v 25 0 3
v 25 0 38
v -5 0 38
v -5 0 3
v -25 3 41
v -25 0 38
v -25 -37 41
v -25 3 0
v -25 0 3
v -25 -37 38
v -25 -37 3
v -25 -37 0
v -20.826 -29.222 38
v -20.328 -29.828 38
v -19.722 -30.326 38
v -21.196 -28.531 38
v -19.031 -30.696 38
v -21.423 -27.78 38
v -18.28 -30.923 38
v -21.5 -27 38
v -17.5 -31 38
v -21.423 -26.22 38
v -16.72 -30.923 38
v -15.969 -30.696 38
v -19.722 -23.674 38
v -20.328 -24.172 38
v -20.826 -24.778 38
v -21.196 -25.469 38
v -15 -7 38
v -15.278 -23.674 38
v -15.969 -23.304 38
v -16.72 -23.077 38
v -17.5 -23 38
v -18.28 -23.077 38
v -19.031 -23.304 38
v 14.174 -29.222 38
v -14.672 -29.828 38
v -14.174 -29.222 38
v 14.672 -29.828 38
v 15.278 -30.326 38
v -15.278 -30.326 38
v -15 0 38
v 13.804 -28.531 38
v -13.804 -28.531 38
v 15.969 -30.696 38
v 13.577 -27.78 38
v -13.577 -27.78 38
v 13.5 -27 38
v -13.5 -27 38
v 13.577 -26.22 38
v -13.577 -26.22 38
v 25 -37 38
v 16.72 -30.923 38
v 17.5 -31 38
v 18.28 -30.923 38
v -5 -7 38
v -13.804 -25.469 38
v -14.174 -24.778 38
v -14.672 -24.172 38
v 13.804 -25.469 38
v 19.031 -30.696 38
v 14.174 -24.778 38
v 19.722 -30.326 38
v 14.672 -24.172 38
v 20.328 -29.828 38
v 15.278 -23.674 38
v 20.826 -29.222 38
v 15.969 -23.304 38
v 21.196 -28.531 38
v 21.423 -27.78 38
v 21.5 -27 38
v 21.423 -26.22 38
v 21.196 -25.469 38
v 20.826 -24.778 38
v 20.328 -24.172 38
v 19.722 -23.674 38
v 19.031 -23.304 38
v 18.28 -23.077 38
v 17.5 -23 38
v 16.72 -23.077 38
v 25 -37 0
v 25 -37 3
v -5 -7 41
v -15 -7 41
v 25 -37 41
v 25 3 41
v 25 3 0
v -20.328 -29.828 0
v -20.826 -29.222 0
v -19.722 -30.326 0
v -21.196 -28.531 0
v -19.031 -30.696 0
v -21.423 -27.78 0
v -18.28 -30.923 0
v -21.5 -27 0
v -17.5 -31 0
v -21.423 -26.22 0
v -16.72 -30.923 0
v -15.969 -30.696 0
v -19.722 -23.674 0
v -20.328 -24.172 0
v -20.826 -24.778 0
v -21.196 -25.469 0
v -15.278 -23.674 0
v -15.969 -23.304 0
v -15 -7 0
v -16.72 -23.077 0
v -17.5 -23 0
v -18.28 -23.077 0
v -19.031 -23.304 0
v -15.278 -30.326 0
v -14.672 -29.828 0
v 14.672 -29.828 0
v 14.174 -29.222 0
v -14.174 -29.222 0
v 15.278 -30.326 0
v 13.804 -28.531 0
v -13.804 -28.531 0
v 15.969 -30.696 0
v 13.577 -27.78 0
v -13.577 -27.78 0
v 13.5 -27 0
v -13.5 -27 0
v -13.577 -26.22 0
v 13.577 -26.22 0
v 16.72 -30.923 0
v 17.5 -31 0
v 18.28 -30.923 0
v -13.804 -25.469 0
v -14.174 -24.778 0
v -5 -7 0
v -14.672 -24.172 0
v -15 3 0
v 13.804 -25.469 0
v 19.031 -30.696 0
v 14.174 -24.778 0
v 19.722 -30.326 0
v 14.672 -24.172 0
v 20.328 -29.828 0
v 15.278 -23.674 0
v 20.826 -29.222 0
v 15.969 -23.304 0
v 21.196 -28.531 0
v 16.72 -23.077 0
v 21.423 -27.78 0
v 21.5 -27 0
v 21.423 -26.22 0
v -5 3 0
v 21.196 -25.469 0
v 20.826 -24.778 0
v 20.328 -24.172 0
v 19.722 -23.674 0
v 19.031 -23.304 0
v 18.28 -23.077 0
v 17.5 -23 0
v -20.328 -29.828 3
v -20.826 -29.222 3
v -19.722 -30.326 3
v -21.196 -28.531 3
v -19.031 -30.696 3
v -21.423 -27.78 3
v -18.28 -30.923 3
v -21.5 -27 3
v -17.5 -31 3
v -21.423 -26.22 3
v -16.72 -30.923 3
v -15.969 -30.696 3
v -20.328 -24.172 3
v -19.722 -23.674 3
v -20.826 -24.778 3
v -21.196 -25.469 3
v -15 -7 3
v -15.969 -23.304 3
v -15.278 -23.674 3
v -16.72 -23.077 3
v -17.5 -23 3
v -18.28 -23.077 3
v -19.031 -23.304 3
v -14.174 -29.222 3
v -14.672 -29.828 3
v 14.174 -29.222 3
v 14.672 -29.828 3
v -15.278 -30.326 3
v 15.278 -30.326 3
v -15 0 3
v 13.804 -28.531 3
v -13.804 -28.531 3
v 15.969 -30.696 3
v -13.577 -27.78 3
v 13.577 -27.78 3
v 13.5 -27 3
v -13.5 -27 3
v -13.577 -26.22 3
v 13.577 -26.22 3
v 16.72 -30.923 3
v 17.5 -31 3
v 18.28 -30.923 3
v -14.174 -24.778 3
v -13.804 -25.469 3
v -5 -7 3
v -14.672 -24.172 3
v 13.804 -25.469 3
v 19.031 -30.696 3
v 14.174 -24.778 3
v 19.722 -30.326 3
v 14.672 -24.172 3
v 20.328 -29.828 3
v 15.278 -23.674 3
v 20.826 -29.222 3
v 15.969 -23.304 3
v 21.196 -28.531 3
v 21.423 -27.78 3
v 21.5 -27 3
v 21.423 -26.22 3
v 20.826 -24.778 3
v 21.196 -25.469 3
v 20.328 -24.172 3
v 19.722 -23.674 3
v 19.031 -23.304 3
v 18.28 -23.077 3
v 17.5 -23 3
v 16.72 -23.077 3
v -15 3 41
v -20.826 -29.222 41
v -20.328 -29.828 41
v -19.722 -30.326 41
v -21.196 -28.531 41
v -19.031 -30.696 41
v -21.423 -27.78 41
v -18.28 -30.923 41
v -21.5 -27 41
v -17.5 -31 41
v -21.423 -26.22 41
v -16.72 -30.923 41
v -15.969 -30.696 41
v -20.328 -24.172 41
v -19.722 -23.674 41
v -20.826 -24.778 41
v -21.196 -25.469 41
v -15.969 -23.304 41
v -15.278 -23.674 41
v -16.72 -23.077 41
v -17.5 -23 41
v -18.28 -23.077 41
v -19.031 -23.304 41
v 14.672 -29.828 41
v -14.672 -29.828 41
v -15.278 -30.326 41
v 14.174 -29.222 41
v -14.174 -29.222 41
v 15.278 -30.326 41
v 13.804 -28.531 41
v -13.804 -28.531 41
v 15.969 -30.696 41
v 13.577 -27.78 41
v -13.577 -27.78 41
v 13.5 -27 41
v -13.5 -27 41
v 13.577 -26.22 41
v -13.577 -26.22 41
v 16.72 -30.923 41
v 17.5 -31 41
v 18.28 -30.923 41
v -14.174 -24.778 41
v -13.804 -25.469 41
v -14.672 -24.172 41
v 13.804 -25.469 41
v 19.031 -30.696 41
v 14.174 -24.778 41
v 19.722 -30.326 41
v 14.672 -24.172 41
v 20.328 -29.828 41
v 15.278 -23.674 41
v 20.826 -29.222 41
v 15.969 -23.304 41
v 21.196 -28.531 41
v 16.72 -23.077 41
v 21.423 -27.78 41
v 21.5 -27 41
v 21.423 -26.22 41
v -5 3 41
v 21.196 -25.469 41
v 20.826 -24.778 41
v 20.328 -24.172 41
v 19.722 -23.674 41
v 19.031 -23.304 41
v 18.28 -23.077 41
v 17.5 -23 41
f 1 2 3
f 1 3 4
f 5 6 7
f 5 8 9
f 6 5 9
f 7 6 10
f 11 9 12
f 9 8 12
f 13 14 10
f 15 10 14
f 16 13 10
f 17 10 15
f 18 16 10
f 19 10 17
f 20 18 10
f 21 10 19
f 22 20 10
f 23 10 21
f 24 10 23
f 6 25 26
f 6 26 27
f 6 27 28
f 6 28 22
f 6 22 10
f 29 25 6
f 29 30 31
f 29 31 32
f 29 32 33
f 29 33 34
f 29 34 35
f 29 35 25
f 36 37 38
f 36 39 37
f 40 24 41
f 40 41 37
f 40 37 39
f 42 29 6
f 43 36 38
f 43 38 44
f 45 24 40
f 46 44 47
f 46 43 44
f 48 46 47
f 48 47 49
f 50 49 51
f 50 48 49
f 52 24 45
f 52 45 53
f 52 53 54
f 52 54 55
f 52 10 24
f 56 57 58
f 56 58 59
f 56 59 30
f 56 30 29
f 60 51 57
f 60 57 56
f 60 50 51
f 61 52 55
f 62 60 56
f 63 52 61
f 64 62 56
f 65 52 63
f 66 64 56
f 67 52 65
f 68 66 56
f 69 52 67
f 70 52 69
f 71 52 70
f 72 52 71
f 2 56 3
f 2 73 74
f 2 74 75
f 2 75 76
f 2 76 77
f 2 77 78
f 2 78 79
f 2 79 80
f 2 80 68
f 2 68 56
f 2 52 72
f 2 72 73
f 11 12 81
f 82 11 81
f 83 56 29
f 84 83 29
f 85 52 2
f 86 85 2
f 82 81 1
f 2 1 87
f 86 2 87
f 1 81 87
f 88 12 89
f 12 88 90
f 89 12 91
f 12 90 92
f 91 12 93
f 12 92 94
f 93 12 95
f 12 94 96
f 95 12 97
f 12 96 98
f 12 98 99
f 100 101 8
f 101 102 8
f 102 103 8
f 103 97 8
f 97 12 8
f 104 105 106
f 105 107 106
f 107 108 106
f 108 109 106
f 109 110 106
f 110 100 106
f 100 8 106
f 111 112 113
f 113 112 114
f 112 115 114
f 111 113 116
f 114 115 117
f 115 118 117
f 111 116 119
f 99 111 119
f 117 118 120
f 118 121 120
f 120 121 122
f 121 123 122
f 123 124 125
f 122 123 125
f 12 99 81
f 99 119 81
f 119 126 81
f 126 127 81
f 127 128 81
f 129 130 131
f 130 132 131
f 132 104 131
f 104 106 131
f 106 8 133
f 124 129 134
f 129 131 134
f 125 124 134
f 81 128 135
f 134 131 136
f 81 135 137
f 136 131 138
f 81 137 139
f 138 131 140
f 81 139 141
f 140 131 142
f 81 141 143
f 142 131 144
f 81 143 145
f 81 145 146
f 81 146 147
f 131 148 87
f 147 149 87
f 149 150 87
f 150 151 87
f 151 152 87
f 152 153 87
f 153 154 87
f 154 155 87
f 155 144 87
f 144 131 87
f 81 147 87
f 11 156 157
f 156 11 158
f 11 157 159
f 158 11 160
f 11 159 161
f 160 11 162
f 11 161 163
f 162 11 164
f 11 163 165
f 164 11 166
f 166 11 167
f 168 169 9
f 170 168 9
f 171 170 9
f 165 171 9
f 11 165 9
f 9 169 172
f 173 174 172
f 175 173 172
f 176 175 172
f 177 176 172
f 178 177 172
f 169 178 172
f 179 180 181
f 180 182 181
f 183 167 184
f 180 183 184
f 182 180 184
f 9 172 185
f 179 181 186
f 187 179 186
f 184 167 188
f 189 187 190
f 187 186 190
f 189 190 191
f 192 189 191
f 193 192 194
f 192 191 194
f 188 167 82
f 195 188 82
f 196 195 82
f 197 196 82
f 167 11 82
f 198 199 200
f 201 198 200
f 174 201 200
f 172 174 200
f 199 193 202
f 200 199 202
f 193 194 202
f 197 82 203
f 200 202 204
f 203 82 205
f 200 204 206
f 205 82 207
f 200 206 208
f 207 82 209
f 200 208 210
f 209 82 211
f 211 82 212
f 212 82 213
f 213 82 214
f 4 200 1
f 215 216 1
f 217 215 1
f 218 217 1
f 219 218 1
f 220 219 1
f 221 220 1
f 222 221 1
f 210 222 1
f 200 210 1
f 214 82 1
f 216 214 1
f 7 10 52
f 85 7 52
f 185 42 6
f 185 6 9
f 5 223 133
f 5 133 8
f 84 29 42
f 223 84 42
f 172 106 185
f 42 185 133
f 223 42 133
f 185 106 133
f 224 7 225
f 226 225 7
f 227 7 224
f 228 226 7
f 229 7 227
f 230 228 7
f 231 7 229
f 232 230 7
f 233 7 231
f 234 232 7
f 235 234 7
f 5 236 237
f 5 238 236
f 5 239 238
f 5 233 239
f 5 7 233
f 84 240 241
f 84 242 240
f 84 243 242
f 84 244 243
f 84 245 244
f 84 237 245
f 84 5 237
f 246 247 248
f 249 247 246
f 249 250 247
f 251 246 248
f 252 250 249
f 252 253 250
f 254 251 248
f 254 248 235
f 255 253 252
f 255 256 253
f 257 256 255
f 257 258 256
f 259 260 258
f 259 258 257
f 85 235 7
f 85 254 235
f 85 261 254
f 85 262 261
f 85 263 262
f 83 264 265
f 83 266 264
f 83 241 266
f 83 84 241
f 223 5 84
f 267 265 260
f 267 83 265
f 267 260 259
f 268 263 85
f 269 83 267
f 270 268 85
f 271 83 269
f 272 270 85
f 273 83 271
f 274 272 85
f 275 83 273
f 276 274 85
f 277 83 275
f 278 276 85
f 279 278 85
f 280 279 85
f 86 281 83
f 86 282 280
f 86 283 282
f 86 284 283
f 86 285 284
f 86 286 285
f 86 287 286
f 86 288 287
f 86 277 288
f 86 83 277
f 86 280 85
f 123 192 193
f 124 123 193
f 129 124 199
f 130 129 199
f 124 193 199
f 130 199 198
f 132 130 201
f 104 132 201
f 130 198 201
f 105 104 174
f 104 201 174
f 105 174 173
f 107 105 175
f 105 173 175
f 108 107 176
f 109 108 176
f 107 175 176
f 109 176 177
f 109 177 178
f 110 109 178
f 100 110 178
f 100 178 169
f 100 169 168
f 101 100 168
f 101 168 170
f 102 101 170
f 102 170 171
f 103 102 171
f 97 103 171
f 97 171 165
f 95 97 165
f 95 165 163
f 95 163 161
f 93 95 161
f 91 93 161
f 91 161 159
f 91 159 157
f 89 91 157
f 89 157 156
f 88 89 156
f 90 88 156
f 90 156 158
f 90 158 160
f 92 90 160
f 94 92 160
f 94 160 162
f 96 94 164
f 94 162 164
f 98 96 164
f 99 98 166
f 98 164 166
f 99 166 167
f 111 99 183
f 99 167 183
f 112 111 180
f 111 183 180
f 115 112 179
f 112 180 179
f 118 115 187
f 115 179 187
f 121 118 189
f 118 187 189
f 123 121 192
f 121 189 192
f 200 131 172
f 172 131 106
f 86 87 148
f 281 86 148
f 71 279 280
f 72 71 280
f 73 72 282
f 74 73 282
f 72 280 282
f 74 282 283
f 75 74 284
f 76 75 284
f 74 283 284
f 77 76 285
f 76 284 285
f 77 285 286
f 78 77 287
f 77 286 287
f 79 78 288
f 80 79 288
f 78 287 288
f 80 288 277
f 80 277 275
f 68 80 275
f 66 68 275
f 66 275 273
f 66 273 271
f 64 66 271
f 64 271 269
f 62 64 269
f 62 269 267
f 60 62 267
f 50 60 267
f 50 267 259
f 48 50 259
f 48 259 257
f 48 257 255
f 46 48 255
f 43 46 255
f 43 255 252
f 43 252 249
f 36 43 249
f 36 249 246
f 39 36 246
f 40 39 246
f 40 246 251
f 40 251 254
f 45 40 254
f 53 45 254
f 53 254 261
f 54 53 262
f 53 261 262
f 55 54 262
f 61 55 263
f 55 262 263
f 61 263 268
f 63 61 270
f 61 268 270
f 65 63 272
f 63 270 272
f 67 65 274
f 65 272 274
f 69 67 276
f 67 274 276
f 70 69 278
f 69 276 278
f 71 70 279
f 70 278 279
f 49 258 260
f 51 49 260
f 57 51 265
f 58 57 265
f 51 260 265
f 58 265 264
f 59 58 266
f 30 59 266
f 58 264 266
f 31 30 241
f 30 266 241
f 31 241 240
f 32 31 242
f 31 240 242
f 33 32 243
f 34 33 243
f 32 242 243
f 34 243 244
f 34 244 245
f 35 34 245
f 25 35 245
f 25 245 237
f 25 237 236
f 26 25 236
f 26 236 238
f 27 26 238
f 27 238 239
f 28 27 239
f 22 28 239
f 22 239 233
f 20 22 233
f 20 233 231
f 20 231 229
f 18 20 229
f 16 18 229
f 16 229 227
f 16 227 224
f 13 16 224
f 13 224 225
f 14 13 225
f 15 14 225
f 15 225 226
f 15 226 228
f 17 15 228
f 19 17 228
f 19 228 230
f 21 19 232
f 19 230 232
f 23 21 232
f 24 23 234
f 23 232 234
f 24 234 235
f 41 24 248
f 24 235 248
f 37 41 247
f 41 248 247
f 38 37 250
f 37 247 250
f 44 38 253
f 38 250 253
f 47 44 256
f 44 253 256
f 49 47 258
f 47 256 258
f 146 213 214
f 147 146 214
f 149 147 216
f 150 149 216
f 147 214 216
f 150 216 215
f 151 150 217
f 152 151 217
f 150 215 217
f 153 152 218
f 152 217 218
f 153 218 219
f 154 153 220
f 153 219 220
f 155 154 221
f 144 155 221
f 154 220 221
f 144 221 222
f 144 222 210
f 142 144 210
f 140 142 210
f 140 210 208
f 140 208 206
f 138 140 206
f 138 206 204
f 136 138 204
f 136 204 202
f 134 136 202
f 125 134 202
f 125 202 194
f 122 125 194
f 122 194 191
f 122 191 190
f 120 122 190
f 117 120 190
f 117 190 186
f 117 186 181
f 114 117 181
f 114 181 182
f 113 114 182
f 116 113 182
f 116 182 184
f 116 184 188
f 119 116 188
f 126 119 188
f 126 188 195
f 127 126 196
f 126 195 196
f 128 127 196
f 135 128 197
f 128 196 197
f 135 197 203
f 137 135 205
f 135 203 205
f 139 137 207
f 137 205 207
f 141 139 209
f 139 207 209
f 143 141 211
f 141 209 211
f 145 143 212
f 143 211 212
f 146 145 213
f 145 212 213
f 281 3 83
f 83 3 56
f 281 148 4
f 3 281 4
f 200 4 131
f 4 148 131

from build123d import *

# Parameters (mm, degrees)
EXTRUDE_1_DEPTH     = 41
SKETCH_2_W          = 35
SKETCH_2_H          = 37
CUT_EXTRUDE_1_DEPTH = 75.498322129
SKETCH_3_R          = 4
CUT_EXTRUDE_2_DEPTH = 61.621778265


with BuildPart() as part:
    # ｽｹｯﾁ1 → ﾎﾞｽ - 押し出し1 (new body)
    with BuildSketch(Plane.XY):
        Polygon((-25, -37), (25, -37), (25, 3), (-5, 3), (-5, -7), (-15, -7), (-15, 3), (-25, 3), align=None)
    extrude(amount=EXTRUDE_1_DEPTH)

    # ｽｹｯﾁ2 → ｶｯﾄ - 押し出し1 (cut, through all)
    with BuildSketch(Plane(origin=(25, 0, 0), x_dir=(0, 0, -1), z_dir=(1, 0, 0))):
        with Locations((-20.5, -18.5)):
            Rectangle(SKETCH_2_W, SKETCH_2_H)
    extrude(amount=-CUT_EXTRUDE_1_DEPTH, mode=Mode.SUBTRACT)

    # ｽｹｯﾁ3 → ｶｯﾄ - 押し出し2 (cut, through all)
    with BuildSketch(Plane.XY.offset(41)):
        with Locations((-17.5, -27)):
            Circle(SKETCH_3_R)
        with Locations((17.5, -27)):
            Circle(SKETCH_3_R)
    extrude(amount=-CUT_EXTRUDE_2_DEPTH, mode=Mode.SUBTRACT)


solid = part.part
